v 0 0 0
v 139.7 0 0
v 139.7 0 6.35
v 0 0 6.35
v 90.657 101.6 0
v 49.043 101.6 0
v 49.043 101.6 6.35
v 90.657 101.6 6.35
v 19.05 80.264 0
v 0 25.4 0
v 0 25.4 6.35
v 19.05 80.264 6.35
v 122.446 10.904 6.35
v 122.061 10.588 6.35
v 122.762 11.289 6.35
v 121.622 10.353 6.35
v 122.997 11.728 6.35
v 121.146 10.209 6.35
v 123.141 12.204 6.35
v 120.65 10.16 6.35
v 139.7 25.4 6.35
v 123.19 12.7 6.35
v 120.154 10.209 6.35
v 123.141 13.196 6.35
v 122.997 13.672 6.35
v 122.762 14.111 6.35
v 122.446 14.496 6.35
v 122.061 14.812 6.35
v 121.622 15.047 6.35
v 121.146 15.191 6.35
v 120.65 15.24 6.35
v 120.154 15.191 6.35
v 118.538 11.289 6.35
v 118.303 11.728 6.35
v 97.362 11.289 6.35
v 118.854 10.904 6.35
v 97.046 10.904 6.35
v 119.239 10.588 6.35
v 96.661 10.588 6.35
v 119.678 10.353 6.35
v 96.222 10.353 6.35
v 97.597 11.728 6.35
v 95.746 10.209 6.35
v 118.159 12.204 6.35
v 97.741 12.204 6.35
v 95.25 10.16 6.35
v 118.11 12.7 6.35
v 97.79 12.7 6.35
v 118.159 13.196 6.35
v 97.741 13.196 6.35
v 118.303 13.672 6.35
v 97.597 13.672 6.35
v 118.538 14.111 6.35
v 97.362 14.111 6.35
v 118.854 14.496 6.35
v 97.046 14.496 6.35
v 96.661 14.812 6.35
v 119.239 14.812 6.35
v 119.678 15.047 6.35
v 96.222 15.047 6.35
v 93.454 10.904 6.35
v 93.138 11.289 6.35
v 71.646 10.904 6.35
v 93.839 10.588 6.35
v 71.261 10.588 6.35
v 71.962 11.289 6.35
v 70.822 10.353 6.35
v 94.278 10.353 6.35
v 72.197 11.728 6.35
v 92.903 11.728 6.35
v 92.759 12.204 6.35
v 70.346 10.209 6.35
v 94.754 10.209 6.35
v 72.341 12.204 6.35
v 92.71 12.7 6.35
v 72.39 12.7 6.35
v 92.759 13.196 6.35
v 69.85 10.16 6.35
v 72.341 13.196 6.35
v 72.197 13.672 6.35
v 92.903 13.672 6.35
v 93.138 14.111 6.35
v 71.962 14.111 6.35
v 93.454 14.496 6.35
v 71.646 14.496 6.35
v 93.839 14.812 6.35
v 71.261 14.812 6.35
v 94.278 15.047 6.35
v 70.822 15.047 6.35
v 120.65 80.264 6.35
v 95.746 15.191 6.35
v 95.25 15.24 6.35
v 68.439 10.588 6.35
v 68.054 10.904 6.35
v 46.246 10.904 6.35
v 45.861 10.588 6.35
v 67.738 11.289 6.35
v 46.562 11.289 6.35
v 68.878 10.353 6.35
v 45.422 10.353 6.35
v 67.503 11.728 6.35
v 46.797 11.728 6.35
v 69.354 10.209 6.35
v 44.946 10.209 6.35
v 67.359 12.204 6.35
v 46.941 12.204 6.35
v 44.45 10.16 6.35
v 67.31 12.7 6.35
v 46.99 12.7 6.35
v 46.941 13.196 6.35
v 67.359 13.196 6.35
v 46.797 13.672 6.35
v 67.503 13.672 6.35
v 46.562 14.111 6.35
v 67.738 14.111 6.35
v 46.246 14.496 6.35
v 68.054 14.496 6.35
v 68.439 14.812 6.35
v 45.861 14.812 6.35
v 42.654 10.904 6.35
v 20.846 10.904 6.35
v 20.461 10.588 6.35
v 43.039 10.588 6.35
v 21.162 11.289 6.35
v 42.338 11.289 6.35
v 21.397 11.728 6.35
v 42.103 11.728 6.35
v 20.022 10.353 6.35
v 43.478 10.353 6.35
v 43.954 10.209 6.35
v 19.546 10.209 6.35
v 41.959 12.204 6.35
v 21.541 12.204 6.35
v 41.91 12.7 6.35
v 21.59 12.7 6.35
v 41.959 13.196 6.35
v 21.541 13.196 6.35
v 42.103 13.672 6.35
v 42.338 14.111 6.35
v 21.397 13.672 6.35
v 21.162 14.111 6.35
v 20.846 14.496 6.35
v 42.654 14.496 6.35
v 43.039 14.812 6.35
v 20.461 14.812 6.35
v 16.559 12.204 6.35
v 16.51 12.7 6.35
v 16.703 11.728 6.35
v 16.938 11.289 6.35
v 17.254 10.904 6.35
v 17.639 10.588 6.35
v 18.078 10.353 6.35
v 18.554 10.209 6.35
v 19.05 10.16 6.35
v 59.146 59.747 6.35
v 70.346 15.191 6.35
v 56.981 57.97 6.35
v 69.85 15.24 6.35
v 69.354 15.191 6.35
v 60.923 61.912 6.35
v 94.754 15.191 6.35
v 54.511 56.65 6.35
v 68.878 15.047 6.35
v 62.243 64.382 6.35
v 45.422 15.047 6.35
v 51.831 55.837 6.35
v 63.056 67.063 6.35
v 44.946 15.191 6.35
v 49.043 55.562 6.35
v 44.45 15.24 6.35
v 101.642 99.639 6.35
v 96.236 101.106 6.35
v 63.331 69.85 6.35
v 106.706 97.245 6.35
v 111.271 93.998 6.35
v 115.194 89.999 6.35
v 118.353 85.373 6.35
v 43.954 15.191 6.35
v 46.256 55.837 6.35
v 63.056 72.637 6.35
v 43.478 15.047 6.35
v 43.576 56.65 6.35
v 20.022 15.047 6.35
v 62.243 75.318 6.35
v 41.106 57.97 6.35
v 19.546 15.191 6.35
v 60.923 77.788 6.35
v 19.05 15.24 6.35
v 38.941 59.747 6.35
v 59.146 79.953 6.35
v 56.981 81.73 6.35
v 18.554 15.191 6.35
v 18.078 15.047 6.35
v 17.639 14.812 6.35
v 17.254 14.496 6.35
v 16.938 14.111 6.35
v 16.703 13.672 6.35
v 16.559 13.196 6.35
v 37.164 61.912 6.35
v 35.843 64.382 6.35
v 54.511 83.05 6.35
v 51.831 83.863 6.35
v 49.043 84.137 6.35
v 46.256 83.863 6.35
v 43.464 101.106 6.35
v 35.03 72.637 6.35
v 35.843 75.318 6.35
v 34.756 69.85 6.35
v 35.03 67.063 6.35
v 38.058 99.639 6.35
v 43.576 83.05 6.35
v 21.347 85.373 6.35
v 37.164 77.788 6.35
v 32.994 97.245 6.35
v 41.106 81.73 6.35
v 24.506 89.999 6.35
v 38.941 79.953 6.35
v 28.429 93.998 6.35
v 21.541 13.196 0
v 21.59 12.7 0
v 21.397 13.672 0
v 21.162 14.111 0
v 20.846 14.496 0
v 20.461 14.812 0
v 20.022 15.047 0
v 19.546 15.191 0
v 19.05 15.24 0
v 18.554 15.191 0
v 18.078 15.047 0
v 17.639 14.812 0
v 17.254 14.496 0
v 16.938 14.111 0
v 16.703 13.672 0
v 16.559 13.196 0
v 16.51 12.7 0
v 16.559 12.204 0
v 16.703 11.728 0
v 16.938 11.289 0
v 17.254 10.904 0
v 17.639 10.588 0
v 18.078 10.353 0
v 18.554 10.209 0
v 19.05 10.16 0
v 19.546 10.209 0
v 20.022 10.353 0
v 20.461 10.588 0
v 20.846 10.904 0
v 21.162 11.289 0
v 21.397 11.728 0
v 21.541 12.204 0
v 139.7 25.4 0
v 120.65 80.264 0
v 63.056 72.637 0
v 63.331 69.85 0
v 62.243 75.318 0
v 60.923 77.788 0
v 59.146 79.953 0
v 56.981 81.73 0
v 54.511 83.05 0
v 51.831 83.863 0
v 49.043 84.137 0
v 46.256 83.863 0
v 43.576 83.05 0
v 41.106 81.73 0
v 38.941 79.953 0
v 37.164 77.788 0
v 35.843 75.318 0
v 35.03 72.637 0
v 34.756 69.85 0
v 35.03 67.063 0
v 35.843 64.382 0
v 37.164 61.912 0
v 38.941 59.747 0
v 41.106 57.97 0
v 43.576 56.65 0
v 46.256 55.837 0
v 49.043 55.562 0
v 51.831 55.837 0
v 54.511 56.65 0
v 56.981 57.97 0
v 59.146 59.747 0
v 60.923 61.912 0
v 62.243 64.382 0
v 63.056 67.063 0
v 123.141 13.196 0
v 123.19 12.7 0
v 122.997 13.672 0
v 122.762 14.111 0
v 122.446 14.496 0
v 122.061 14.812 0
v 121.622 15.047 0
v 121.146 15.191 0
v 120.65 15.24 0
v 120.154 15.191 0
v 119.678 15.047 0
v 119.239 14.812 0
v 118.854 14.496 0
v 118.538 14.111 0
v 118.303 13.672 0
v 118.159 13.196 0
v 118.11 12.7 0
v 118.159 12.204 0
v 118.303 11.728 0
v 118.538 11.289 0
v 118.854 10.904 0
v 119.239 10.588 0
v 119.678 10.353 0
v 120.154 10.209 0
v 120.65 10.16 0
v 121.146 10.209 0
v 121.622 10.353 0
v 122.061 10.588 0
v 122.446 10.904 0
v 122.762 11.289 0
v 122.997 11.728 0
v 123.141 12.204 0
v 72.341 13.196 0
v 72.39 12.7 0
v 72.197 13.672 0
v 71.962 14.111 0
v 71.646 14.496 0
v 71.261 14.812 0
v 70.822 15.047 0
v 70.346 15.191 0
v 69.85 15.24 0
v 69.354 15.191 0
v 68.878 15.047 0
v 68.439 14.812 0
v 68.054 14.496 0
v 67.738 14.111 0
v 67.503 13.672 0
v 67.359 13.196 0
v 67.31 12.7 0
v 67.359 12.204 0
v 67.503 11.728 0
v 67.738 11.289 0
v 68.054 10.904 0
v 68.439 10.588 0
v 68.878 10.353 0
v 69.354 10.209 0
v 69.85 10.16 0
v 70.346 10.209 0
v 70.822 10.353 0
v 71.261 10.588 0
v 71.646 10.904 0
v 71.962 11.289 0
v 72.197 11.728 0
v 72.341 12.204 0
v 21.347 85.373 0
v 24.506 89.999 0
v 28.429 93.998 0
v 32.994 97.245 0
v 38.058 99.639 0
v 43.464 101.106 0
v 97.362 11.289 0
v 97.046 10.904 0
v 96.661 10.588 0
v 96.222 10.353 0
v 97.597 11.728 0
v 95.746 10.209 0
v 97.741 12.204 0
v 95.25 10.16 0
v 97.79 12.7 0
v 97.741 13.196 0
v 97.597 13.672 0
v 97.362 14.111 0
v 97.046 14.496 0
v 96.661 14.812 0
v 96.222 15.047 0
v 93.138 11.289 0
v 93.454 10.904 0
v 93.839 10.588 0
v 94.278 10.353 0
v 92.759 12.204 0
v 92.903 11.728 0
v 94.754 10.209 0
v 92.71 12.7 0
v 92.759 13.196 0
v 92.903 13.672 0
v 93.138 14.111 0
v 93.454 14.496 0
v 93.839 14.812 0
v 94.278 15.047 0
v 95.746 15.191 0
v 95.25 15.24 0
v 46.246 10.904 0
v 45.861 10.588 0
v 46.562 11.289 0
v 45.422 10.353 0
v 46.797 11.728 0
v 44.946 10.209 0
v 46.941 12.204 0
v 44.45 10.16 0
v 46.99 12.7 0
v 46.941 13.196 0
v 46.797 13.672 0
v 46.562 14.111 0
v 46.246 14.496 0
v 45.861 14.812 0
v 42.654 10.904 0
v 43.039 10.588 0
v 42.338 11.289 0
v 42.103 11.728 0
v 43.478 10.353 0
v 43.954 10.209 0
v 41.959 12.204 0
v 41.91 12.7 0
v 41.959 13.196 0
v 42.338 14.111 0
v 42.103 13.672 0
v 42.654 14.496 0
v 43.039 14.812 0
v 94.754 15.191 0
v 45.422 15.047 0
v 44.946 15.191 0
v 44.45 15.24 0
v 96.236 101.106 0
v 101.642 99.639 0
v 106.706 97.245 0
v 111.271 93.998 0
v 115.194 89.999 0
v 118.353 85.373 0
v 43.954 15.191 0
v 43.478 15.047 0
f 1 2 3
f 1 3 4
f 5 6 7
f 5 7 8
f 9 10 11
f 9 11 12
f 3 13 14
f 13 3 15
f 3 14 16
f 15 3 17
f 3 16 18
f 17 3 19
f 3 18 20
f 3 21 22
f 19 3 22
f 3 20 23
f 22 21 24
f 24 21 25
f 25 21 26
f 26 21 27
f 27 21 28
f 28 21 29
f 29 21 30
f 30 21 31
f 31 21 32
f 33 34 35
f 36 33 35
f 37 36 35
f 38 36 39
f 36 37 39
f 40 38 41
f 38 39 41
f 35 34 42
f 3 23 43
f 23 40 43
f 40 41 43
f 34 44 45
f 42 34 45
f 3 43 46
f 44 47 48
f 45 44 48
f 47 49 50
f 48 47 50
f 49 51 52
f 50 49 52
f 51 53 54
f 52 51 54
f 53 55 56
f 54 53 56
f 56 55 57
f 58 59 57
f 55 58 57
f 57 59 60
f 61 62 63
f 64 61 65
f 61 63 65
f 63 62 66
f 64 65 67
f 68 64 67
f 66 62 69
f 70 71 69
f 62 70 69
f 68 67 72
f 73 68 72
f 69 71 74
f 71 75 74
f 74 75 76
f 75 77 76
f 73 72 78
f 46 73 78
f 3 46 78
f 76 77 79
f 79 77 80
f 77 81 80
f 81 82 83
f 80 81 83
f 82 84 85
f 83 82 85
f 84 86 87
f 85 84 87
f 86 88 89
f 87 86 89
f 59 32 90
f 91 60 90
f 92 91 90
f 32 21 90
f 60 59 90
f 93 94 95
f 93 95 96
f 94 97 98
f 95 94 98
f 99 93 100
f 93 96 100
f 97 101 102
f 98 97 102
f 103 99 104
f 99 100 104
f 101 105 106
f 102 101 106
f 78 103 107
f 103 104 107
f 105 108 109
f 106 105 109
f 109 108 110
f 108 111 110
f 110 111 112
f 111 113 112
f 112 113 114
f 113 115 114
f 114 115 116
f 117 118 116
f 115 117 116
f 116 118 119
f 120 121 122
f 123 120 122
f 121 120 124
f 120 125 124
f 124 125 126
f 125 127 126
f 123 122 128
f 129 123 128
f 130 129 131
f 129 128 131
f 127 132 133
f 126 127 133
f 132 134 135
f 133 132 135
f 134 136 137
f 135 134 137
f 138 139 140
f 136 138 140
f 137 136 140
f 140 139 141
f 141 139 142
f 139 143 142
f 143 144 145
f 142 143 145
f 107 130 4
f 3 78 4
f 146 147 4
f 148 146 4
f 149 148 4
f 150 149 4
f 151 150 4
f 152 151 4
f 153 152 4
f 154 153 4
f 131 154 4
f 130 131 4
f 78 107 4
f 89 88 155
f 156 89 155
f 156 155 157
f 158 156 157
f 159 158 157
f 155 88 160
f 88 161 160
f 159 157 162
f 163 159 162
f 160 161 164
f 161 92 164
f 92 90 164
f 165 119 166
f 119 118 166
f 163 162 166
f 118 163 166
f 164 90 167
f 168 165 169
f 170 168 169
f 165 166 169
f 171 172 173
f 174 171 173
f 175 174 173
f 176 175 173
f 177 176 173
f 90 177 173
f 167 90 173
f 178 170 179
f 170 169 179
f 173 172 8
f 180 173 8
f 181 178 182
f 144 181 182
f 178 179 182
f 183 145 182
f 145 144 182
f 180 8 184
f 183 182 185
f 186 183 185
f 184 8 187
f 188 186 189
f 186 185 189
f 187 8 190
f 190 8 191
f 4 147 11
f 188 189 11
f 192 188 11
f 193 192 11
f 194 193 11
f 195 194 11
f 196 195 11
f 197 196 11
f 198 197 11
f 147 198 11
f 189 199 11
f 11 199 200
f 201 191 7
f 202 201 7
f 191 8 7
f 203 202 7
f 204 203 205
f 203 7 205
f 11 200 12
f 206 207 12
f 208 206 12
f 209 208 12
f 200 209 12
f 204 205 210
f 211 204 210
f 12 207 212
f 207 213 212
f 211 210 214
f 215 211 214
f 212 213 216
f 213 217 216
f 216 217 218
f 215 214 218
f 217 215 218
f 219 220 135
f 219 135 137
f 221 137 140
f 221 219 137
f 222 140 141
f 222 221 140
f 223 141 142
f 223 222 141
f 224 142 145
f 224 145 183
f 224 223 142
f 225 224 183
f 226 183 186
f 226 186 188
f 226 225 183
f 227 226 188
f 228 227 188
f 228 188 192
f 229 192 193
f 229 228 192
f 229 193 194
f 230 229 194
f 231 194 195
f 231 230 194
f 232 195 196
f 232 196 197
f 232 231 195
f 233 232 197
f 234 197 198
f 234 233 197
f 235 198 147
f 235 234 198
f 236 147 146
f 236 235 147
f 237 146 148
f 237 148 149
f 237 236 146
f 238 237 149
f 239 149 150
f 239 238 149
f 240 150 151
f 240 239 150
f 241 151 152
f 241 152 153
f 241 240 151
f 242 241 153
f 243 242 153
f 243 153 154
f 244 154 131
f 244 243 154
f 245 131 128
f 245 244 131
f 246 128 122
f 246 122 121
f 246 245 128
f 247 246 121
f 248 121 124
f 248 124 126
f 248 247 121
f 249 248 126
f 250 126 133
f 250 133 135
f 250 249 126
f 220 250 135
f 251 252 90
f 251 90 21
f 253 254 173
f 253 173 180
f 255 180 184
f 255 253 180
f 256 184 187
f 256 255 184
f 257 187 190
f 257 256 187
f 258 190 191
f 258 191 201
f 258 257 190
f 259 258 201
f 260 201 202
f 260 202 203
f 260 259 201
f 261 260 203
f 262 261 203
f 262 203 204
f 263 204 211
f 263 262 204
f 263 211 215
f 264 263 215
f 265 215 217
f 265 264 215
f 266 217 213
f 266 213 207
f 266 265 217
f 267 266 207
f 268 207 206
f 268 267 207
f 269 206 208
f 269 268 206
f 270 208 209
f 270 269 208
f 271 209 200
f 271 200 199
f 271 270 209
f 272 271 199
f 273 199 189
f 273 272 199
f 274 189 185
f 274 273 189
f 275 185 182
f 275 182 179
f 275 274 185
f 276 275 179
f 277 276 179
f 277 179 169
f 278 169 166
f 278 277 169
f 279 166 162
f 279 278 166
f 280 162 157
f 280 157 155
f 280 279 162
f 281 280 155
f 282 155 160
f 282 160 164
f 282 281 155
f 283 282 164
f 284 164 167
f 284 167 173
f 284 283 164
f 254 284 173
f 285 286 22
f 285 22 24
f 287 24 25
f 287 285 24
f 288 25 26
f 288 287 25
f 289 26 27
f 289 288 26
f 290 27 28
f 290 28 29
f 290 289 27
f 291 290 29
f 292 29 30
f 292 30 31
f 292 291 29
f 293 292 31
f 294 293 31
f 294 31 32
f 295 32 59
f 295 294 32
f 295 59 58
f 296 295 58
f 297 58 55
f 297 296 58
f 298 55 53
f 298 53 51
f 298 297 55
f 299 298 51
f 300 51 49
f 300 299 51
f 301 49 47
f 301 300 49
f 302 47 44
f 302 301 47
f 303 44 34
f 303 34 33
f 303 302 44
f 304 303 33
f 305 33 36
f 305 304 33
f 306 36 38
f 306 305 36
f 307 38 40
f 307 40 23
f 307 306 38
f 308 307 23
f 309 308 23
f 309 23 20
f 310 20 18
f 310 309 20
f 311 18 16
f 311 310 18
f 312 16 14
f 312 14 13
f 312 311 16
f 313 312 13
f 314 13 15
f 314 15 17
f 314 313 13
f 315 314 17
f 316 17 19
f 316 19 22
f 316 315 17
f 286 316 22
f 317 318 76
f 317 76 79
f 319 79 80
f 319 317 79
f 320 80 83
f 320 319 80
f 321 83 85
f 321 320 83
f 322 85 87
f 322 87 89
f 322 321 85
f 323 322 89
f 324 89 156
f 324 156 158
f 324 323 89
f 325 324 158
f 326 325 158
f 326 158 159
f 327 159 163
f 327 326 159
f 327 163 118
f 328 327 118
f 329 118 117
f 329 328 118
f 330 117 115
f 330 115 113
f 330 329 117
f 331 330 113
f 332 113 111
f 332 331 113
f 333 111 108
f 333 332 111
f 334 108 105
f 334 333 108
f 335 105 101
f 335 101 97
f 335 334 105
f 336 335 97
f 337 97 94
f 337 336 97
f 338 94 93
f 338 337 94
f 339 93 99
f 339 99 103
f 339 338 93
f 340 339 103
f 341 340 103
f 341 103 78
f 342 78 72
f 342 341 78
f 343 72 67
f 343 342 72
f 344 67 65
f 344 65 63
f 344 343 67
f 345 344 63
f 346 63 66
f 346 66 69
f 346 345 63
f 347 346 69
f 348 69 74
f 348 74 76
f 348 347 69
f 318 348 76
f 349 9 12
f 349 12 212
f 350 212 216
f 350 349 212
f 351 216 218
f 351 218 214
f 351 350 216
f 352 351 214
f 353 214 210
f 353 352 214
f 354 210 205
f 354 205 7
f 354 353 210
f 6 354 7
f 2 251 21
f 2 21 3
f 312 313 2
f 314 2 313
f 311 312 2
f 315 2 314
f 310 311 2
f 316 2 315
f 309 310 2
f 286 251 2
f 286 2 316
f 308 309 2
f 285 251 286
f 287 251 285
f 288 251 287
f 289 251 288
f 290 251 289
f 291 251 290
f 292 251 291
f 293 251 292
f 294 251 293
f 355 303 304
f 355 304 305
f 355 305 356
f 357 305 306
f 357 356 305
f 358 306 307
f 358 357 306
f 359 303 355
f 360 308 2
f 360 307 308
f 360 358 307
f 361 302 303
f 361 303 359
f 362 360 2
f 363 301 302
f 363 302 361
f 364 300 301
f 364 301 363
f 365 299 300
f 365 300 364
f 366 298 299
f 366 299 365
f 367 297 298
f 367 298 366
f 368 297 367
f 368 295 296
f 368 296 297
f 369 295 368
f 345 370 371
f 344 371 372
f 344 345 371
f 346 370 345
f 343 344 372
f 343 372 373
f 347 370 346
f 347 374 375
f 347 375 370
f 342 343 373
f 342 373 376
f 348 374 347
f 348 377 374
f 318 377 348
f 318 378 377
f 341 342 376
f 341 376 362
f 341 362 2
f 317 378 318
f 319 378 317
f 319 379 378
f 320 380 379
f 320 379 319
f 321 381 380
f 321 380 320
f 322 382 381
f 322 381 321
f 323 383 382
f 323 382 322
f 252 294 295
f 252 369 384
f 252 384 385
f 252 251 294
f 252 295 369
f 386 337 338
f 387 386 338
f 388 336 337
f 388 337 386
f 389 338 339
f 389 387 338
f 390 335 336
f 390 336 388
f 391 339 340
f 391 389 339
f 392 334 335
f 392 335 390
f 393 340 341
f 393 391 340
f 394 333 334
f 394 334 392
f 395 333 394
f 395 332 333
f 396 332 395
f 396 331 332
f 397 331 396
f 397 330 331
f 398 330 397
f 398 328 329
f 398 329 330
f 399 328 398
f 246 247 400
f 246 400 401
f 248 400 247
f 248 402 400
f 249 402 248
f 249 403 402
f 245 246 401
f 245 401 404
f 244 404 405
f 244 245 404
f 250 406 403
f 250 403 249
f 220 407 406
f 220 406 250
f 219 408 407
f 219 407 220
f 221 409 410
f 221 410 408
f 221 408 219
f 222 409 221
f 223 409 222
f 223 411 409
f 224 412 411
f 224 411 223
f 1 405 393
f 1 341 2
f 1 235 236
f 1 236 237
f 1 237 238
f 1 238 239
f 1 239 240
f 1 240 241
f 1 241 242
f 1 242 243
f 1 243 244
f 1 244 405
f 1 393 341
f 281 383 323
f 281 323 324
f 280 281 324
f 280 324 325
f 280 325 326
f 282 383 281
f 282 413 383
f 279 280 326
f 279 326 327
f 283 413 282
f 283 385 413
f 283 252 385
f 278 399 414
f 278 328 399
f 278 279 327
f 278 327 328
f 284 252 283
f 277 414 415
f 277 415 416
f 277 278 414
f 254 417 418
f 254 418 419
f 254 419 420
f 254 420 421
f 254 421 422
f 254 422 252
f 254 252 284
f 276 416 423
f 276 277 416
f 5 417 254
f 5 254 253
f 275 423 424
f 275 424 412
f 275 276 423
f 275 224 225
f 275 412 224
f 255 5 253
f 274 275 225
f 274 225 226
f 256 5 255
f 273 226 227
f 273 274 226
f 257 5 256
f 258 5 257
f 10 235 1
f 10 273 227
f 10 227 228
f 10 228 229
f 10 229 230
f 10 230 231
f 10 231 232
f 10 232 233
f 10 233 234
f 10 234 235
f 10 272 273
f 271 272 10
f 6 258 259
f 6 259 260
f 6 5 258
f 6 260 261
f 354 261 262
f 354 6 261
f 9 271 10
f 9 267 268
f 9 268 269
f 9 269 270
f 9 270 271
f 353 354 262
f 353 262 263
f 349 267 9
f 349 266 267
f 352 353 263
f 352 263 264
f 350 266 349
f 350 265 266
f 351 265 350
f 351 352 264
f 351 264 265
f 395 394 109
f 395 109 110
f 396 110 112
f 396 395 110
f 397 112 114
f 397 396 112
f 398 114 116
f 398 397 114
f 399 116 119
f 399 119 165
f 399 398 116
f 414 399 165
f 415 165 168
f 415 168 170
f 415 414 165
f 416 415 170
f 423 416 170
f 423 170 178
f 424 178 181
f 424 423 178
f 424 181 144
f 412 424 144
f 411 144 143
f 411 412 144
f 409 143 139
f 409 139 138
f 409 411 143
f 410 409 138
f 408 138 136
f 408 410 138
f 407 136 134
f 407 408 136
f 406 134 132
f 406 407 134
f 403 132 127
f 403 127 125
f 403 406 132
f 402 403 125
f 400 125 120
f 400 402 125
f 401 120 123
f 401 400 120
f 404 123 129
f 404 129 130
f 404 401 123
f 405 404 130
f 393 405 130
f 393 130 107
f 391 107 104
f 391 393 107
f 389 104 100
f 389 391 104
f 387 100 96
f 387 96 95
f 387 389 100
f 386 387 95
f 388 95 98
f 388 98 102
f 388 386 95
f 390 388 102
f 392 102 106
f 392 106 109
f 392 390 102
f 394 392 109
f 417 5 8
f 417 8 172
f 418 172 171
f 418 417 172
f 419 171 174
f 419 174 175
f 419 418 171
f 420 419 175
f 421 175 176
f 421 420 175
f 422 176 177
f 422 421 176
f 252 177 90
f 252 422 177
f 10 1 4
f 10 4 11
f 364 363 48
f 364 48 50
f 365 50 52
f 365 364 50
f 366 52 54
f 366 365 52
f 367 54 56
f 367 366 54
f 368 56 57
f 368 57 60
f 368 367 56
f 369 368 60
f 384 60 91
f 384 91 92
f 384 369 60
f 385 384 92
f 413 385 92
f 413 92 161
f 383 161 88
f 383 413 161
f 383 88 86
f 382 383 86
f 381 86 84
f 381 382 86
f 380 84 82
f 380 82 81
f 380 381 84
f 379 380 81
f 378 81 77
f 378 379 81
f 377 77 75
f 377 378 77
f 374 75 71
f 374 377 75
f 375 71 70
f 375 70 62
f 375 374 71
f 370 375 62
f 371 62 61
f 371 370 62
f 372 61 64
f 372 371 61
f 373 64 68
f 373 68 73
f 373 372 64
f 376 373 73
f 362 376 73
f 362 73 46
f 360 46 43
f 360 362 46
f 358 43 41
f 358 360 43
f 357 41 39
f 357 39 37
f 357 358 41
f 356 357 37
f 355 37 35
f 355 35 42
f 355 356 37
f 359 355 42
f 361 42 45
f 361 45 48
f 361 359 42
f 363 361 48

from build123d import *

# Parameters (mm, degrees)
SKETCH1_R           = 14.2875
SKETCH1_R_2         = 2.54
BOSS_EXTRUDE1_DEPTH = 6.35


with BuildPart() as part:
    # Sketch1 → Boss-Extrude1 (new body)
    with BuildSketch(Plane.XY):
        with BuildLine():
            Line((49.043407506, 101.6), (90.656592494, 101.6))
            ThreePointArc((90.656592494, 101.6), (109.060504085, 95.721964327), (120.65, 80.264317364))
            Line((120.65, 80.264317364), (139.7, 25.4))
            Line((139.7, 25.4), (139.7, 0))
            Line((139.7, 0), (0, 0))
            Line((0, 0), (0, 25.4))
            Line((0, 25.4), (19.05, 80.264317364))
            ThreePointArc((19.05, 80.264317364), (30.639495915, 95.721964327), (49.043407506, 101.6))
        make_face()
        with Locations((49.043407506, 69.85)):
            Circle(SKETCH1_R, mode=Mode.SUBTRACT)
        with Locations((69.85, 12.7)):
            Circle(SKETCH1_R_2, mode=Mode.SUBTRACT)
        with Locations((95.25, 12.7)):
            Circle(SKETCH1_R_2, mode=Mode.SUBTRACT)
        with Locations((120.65, 12.7)):
            Circle(SKETCH1_R_2, mode=Mode.SUBTRACT)
        with Locations((44.45, 12.7)):
            Circle(SKETCH1_R_2, mode=Mode.SUBTRACT)
        with Locations((19.05, 12.7)):
            Circle(SKETCH1_R_2, mode=Mode.SUBTRACT)
    extrude(amount=BOSS_EXTRUDE1_DEPTH)


solid = part.part
